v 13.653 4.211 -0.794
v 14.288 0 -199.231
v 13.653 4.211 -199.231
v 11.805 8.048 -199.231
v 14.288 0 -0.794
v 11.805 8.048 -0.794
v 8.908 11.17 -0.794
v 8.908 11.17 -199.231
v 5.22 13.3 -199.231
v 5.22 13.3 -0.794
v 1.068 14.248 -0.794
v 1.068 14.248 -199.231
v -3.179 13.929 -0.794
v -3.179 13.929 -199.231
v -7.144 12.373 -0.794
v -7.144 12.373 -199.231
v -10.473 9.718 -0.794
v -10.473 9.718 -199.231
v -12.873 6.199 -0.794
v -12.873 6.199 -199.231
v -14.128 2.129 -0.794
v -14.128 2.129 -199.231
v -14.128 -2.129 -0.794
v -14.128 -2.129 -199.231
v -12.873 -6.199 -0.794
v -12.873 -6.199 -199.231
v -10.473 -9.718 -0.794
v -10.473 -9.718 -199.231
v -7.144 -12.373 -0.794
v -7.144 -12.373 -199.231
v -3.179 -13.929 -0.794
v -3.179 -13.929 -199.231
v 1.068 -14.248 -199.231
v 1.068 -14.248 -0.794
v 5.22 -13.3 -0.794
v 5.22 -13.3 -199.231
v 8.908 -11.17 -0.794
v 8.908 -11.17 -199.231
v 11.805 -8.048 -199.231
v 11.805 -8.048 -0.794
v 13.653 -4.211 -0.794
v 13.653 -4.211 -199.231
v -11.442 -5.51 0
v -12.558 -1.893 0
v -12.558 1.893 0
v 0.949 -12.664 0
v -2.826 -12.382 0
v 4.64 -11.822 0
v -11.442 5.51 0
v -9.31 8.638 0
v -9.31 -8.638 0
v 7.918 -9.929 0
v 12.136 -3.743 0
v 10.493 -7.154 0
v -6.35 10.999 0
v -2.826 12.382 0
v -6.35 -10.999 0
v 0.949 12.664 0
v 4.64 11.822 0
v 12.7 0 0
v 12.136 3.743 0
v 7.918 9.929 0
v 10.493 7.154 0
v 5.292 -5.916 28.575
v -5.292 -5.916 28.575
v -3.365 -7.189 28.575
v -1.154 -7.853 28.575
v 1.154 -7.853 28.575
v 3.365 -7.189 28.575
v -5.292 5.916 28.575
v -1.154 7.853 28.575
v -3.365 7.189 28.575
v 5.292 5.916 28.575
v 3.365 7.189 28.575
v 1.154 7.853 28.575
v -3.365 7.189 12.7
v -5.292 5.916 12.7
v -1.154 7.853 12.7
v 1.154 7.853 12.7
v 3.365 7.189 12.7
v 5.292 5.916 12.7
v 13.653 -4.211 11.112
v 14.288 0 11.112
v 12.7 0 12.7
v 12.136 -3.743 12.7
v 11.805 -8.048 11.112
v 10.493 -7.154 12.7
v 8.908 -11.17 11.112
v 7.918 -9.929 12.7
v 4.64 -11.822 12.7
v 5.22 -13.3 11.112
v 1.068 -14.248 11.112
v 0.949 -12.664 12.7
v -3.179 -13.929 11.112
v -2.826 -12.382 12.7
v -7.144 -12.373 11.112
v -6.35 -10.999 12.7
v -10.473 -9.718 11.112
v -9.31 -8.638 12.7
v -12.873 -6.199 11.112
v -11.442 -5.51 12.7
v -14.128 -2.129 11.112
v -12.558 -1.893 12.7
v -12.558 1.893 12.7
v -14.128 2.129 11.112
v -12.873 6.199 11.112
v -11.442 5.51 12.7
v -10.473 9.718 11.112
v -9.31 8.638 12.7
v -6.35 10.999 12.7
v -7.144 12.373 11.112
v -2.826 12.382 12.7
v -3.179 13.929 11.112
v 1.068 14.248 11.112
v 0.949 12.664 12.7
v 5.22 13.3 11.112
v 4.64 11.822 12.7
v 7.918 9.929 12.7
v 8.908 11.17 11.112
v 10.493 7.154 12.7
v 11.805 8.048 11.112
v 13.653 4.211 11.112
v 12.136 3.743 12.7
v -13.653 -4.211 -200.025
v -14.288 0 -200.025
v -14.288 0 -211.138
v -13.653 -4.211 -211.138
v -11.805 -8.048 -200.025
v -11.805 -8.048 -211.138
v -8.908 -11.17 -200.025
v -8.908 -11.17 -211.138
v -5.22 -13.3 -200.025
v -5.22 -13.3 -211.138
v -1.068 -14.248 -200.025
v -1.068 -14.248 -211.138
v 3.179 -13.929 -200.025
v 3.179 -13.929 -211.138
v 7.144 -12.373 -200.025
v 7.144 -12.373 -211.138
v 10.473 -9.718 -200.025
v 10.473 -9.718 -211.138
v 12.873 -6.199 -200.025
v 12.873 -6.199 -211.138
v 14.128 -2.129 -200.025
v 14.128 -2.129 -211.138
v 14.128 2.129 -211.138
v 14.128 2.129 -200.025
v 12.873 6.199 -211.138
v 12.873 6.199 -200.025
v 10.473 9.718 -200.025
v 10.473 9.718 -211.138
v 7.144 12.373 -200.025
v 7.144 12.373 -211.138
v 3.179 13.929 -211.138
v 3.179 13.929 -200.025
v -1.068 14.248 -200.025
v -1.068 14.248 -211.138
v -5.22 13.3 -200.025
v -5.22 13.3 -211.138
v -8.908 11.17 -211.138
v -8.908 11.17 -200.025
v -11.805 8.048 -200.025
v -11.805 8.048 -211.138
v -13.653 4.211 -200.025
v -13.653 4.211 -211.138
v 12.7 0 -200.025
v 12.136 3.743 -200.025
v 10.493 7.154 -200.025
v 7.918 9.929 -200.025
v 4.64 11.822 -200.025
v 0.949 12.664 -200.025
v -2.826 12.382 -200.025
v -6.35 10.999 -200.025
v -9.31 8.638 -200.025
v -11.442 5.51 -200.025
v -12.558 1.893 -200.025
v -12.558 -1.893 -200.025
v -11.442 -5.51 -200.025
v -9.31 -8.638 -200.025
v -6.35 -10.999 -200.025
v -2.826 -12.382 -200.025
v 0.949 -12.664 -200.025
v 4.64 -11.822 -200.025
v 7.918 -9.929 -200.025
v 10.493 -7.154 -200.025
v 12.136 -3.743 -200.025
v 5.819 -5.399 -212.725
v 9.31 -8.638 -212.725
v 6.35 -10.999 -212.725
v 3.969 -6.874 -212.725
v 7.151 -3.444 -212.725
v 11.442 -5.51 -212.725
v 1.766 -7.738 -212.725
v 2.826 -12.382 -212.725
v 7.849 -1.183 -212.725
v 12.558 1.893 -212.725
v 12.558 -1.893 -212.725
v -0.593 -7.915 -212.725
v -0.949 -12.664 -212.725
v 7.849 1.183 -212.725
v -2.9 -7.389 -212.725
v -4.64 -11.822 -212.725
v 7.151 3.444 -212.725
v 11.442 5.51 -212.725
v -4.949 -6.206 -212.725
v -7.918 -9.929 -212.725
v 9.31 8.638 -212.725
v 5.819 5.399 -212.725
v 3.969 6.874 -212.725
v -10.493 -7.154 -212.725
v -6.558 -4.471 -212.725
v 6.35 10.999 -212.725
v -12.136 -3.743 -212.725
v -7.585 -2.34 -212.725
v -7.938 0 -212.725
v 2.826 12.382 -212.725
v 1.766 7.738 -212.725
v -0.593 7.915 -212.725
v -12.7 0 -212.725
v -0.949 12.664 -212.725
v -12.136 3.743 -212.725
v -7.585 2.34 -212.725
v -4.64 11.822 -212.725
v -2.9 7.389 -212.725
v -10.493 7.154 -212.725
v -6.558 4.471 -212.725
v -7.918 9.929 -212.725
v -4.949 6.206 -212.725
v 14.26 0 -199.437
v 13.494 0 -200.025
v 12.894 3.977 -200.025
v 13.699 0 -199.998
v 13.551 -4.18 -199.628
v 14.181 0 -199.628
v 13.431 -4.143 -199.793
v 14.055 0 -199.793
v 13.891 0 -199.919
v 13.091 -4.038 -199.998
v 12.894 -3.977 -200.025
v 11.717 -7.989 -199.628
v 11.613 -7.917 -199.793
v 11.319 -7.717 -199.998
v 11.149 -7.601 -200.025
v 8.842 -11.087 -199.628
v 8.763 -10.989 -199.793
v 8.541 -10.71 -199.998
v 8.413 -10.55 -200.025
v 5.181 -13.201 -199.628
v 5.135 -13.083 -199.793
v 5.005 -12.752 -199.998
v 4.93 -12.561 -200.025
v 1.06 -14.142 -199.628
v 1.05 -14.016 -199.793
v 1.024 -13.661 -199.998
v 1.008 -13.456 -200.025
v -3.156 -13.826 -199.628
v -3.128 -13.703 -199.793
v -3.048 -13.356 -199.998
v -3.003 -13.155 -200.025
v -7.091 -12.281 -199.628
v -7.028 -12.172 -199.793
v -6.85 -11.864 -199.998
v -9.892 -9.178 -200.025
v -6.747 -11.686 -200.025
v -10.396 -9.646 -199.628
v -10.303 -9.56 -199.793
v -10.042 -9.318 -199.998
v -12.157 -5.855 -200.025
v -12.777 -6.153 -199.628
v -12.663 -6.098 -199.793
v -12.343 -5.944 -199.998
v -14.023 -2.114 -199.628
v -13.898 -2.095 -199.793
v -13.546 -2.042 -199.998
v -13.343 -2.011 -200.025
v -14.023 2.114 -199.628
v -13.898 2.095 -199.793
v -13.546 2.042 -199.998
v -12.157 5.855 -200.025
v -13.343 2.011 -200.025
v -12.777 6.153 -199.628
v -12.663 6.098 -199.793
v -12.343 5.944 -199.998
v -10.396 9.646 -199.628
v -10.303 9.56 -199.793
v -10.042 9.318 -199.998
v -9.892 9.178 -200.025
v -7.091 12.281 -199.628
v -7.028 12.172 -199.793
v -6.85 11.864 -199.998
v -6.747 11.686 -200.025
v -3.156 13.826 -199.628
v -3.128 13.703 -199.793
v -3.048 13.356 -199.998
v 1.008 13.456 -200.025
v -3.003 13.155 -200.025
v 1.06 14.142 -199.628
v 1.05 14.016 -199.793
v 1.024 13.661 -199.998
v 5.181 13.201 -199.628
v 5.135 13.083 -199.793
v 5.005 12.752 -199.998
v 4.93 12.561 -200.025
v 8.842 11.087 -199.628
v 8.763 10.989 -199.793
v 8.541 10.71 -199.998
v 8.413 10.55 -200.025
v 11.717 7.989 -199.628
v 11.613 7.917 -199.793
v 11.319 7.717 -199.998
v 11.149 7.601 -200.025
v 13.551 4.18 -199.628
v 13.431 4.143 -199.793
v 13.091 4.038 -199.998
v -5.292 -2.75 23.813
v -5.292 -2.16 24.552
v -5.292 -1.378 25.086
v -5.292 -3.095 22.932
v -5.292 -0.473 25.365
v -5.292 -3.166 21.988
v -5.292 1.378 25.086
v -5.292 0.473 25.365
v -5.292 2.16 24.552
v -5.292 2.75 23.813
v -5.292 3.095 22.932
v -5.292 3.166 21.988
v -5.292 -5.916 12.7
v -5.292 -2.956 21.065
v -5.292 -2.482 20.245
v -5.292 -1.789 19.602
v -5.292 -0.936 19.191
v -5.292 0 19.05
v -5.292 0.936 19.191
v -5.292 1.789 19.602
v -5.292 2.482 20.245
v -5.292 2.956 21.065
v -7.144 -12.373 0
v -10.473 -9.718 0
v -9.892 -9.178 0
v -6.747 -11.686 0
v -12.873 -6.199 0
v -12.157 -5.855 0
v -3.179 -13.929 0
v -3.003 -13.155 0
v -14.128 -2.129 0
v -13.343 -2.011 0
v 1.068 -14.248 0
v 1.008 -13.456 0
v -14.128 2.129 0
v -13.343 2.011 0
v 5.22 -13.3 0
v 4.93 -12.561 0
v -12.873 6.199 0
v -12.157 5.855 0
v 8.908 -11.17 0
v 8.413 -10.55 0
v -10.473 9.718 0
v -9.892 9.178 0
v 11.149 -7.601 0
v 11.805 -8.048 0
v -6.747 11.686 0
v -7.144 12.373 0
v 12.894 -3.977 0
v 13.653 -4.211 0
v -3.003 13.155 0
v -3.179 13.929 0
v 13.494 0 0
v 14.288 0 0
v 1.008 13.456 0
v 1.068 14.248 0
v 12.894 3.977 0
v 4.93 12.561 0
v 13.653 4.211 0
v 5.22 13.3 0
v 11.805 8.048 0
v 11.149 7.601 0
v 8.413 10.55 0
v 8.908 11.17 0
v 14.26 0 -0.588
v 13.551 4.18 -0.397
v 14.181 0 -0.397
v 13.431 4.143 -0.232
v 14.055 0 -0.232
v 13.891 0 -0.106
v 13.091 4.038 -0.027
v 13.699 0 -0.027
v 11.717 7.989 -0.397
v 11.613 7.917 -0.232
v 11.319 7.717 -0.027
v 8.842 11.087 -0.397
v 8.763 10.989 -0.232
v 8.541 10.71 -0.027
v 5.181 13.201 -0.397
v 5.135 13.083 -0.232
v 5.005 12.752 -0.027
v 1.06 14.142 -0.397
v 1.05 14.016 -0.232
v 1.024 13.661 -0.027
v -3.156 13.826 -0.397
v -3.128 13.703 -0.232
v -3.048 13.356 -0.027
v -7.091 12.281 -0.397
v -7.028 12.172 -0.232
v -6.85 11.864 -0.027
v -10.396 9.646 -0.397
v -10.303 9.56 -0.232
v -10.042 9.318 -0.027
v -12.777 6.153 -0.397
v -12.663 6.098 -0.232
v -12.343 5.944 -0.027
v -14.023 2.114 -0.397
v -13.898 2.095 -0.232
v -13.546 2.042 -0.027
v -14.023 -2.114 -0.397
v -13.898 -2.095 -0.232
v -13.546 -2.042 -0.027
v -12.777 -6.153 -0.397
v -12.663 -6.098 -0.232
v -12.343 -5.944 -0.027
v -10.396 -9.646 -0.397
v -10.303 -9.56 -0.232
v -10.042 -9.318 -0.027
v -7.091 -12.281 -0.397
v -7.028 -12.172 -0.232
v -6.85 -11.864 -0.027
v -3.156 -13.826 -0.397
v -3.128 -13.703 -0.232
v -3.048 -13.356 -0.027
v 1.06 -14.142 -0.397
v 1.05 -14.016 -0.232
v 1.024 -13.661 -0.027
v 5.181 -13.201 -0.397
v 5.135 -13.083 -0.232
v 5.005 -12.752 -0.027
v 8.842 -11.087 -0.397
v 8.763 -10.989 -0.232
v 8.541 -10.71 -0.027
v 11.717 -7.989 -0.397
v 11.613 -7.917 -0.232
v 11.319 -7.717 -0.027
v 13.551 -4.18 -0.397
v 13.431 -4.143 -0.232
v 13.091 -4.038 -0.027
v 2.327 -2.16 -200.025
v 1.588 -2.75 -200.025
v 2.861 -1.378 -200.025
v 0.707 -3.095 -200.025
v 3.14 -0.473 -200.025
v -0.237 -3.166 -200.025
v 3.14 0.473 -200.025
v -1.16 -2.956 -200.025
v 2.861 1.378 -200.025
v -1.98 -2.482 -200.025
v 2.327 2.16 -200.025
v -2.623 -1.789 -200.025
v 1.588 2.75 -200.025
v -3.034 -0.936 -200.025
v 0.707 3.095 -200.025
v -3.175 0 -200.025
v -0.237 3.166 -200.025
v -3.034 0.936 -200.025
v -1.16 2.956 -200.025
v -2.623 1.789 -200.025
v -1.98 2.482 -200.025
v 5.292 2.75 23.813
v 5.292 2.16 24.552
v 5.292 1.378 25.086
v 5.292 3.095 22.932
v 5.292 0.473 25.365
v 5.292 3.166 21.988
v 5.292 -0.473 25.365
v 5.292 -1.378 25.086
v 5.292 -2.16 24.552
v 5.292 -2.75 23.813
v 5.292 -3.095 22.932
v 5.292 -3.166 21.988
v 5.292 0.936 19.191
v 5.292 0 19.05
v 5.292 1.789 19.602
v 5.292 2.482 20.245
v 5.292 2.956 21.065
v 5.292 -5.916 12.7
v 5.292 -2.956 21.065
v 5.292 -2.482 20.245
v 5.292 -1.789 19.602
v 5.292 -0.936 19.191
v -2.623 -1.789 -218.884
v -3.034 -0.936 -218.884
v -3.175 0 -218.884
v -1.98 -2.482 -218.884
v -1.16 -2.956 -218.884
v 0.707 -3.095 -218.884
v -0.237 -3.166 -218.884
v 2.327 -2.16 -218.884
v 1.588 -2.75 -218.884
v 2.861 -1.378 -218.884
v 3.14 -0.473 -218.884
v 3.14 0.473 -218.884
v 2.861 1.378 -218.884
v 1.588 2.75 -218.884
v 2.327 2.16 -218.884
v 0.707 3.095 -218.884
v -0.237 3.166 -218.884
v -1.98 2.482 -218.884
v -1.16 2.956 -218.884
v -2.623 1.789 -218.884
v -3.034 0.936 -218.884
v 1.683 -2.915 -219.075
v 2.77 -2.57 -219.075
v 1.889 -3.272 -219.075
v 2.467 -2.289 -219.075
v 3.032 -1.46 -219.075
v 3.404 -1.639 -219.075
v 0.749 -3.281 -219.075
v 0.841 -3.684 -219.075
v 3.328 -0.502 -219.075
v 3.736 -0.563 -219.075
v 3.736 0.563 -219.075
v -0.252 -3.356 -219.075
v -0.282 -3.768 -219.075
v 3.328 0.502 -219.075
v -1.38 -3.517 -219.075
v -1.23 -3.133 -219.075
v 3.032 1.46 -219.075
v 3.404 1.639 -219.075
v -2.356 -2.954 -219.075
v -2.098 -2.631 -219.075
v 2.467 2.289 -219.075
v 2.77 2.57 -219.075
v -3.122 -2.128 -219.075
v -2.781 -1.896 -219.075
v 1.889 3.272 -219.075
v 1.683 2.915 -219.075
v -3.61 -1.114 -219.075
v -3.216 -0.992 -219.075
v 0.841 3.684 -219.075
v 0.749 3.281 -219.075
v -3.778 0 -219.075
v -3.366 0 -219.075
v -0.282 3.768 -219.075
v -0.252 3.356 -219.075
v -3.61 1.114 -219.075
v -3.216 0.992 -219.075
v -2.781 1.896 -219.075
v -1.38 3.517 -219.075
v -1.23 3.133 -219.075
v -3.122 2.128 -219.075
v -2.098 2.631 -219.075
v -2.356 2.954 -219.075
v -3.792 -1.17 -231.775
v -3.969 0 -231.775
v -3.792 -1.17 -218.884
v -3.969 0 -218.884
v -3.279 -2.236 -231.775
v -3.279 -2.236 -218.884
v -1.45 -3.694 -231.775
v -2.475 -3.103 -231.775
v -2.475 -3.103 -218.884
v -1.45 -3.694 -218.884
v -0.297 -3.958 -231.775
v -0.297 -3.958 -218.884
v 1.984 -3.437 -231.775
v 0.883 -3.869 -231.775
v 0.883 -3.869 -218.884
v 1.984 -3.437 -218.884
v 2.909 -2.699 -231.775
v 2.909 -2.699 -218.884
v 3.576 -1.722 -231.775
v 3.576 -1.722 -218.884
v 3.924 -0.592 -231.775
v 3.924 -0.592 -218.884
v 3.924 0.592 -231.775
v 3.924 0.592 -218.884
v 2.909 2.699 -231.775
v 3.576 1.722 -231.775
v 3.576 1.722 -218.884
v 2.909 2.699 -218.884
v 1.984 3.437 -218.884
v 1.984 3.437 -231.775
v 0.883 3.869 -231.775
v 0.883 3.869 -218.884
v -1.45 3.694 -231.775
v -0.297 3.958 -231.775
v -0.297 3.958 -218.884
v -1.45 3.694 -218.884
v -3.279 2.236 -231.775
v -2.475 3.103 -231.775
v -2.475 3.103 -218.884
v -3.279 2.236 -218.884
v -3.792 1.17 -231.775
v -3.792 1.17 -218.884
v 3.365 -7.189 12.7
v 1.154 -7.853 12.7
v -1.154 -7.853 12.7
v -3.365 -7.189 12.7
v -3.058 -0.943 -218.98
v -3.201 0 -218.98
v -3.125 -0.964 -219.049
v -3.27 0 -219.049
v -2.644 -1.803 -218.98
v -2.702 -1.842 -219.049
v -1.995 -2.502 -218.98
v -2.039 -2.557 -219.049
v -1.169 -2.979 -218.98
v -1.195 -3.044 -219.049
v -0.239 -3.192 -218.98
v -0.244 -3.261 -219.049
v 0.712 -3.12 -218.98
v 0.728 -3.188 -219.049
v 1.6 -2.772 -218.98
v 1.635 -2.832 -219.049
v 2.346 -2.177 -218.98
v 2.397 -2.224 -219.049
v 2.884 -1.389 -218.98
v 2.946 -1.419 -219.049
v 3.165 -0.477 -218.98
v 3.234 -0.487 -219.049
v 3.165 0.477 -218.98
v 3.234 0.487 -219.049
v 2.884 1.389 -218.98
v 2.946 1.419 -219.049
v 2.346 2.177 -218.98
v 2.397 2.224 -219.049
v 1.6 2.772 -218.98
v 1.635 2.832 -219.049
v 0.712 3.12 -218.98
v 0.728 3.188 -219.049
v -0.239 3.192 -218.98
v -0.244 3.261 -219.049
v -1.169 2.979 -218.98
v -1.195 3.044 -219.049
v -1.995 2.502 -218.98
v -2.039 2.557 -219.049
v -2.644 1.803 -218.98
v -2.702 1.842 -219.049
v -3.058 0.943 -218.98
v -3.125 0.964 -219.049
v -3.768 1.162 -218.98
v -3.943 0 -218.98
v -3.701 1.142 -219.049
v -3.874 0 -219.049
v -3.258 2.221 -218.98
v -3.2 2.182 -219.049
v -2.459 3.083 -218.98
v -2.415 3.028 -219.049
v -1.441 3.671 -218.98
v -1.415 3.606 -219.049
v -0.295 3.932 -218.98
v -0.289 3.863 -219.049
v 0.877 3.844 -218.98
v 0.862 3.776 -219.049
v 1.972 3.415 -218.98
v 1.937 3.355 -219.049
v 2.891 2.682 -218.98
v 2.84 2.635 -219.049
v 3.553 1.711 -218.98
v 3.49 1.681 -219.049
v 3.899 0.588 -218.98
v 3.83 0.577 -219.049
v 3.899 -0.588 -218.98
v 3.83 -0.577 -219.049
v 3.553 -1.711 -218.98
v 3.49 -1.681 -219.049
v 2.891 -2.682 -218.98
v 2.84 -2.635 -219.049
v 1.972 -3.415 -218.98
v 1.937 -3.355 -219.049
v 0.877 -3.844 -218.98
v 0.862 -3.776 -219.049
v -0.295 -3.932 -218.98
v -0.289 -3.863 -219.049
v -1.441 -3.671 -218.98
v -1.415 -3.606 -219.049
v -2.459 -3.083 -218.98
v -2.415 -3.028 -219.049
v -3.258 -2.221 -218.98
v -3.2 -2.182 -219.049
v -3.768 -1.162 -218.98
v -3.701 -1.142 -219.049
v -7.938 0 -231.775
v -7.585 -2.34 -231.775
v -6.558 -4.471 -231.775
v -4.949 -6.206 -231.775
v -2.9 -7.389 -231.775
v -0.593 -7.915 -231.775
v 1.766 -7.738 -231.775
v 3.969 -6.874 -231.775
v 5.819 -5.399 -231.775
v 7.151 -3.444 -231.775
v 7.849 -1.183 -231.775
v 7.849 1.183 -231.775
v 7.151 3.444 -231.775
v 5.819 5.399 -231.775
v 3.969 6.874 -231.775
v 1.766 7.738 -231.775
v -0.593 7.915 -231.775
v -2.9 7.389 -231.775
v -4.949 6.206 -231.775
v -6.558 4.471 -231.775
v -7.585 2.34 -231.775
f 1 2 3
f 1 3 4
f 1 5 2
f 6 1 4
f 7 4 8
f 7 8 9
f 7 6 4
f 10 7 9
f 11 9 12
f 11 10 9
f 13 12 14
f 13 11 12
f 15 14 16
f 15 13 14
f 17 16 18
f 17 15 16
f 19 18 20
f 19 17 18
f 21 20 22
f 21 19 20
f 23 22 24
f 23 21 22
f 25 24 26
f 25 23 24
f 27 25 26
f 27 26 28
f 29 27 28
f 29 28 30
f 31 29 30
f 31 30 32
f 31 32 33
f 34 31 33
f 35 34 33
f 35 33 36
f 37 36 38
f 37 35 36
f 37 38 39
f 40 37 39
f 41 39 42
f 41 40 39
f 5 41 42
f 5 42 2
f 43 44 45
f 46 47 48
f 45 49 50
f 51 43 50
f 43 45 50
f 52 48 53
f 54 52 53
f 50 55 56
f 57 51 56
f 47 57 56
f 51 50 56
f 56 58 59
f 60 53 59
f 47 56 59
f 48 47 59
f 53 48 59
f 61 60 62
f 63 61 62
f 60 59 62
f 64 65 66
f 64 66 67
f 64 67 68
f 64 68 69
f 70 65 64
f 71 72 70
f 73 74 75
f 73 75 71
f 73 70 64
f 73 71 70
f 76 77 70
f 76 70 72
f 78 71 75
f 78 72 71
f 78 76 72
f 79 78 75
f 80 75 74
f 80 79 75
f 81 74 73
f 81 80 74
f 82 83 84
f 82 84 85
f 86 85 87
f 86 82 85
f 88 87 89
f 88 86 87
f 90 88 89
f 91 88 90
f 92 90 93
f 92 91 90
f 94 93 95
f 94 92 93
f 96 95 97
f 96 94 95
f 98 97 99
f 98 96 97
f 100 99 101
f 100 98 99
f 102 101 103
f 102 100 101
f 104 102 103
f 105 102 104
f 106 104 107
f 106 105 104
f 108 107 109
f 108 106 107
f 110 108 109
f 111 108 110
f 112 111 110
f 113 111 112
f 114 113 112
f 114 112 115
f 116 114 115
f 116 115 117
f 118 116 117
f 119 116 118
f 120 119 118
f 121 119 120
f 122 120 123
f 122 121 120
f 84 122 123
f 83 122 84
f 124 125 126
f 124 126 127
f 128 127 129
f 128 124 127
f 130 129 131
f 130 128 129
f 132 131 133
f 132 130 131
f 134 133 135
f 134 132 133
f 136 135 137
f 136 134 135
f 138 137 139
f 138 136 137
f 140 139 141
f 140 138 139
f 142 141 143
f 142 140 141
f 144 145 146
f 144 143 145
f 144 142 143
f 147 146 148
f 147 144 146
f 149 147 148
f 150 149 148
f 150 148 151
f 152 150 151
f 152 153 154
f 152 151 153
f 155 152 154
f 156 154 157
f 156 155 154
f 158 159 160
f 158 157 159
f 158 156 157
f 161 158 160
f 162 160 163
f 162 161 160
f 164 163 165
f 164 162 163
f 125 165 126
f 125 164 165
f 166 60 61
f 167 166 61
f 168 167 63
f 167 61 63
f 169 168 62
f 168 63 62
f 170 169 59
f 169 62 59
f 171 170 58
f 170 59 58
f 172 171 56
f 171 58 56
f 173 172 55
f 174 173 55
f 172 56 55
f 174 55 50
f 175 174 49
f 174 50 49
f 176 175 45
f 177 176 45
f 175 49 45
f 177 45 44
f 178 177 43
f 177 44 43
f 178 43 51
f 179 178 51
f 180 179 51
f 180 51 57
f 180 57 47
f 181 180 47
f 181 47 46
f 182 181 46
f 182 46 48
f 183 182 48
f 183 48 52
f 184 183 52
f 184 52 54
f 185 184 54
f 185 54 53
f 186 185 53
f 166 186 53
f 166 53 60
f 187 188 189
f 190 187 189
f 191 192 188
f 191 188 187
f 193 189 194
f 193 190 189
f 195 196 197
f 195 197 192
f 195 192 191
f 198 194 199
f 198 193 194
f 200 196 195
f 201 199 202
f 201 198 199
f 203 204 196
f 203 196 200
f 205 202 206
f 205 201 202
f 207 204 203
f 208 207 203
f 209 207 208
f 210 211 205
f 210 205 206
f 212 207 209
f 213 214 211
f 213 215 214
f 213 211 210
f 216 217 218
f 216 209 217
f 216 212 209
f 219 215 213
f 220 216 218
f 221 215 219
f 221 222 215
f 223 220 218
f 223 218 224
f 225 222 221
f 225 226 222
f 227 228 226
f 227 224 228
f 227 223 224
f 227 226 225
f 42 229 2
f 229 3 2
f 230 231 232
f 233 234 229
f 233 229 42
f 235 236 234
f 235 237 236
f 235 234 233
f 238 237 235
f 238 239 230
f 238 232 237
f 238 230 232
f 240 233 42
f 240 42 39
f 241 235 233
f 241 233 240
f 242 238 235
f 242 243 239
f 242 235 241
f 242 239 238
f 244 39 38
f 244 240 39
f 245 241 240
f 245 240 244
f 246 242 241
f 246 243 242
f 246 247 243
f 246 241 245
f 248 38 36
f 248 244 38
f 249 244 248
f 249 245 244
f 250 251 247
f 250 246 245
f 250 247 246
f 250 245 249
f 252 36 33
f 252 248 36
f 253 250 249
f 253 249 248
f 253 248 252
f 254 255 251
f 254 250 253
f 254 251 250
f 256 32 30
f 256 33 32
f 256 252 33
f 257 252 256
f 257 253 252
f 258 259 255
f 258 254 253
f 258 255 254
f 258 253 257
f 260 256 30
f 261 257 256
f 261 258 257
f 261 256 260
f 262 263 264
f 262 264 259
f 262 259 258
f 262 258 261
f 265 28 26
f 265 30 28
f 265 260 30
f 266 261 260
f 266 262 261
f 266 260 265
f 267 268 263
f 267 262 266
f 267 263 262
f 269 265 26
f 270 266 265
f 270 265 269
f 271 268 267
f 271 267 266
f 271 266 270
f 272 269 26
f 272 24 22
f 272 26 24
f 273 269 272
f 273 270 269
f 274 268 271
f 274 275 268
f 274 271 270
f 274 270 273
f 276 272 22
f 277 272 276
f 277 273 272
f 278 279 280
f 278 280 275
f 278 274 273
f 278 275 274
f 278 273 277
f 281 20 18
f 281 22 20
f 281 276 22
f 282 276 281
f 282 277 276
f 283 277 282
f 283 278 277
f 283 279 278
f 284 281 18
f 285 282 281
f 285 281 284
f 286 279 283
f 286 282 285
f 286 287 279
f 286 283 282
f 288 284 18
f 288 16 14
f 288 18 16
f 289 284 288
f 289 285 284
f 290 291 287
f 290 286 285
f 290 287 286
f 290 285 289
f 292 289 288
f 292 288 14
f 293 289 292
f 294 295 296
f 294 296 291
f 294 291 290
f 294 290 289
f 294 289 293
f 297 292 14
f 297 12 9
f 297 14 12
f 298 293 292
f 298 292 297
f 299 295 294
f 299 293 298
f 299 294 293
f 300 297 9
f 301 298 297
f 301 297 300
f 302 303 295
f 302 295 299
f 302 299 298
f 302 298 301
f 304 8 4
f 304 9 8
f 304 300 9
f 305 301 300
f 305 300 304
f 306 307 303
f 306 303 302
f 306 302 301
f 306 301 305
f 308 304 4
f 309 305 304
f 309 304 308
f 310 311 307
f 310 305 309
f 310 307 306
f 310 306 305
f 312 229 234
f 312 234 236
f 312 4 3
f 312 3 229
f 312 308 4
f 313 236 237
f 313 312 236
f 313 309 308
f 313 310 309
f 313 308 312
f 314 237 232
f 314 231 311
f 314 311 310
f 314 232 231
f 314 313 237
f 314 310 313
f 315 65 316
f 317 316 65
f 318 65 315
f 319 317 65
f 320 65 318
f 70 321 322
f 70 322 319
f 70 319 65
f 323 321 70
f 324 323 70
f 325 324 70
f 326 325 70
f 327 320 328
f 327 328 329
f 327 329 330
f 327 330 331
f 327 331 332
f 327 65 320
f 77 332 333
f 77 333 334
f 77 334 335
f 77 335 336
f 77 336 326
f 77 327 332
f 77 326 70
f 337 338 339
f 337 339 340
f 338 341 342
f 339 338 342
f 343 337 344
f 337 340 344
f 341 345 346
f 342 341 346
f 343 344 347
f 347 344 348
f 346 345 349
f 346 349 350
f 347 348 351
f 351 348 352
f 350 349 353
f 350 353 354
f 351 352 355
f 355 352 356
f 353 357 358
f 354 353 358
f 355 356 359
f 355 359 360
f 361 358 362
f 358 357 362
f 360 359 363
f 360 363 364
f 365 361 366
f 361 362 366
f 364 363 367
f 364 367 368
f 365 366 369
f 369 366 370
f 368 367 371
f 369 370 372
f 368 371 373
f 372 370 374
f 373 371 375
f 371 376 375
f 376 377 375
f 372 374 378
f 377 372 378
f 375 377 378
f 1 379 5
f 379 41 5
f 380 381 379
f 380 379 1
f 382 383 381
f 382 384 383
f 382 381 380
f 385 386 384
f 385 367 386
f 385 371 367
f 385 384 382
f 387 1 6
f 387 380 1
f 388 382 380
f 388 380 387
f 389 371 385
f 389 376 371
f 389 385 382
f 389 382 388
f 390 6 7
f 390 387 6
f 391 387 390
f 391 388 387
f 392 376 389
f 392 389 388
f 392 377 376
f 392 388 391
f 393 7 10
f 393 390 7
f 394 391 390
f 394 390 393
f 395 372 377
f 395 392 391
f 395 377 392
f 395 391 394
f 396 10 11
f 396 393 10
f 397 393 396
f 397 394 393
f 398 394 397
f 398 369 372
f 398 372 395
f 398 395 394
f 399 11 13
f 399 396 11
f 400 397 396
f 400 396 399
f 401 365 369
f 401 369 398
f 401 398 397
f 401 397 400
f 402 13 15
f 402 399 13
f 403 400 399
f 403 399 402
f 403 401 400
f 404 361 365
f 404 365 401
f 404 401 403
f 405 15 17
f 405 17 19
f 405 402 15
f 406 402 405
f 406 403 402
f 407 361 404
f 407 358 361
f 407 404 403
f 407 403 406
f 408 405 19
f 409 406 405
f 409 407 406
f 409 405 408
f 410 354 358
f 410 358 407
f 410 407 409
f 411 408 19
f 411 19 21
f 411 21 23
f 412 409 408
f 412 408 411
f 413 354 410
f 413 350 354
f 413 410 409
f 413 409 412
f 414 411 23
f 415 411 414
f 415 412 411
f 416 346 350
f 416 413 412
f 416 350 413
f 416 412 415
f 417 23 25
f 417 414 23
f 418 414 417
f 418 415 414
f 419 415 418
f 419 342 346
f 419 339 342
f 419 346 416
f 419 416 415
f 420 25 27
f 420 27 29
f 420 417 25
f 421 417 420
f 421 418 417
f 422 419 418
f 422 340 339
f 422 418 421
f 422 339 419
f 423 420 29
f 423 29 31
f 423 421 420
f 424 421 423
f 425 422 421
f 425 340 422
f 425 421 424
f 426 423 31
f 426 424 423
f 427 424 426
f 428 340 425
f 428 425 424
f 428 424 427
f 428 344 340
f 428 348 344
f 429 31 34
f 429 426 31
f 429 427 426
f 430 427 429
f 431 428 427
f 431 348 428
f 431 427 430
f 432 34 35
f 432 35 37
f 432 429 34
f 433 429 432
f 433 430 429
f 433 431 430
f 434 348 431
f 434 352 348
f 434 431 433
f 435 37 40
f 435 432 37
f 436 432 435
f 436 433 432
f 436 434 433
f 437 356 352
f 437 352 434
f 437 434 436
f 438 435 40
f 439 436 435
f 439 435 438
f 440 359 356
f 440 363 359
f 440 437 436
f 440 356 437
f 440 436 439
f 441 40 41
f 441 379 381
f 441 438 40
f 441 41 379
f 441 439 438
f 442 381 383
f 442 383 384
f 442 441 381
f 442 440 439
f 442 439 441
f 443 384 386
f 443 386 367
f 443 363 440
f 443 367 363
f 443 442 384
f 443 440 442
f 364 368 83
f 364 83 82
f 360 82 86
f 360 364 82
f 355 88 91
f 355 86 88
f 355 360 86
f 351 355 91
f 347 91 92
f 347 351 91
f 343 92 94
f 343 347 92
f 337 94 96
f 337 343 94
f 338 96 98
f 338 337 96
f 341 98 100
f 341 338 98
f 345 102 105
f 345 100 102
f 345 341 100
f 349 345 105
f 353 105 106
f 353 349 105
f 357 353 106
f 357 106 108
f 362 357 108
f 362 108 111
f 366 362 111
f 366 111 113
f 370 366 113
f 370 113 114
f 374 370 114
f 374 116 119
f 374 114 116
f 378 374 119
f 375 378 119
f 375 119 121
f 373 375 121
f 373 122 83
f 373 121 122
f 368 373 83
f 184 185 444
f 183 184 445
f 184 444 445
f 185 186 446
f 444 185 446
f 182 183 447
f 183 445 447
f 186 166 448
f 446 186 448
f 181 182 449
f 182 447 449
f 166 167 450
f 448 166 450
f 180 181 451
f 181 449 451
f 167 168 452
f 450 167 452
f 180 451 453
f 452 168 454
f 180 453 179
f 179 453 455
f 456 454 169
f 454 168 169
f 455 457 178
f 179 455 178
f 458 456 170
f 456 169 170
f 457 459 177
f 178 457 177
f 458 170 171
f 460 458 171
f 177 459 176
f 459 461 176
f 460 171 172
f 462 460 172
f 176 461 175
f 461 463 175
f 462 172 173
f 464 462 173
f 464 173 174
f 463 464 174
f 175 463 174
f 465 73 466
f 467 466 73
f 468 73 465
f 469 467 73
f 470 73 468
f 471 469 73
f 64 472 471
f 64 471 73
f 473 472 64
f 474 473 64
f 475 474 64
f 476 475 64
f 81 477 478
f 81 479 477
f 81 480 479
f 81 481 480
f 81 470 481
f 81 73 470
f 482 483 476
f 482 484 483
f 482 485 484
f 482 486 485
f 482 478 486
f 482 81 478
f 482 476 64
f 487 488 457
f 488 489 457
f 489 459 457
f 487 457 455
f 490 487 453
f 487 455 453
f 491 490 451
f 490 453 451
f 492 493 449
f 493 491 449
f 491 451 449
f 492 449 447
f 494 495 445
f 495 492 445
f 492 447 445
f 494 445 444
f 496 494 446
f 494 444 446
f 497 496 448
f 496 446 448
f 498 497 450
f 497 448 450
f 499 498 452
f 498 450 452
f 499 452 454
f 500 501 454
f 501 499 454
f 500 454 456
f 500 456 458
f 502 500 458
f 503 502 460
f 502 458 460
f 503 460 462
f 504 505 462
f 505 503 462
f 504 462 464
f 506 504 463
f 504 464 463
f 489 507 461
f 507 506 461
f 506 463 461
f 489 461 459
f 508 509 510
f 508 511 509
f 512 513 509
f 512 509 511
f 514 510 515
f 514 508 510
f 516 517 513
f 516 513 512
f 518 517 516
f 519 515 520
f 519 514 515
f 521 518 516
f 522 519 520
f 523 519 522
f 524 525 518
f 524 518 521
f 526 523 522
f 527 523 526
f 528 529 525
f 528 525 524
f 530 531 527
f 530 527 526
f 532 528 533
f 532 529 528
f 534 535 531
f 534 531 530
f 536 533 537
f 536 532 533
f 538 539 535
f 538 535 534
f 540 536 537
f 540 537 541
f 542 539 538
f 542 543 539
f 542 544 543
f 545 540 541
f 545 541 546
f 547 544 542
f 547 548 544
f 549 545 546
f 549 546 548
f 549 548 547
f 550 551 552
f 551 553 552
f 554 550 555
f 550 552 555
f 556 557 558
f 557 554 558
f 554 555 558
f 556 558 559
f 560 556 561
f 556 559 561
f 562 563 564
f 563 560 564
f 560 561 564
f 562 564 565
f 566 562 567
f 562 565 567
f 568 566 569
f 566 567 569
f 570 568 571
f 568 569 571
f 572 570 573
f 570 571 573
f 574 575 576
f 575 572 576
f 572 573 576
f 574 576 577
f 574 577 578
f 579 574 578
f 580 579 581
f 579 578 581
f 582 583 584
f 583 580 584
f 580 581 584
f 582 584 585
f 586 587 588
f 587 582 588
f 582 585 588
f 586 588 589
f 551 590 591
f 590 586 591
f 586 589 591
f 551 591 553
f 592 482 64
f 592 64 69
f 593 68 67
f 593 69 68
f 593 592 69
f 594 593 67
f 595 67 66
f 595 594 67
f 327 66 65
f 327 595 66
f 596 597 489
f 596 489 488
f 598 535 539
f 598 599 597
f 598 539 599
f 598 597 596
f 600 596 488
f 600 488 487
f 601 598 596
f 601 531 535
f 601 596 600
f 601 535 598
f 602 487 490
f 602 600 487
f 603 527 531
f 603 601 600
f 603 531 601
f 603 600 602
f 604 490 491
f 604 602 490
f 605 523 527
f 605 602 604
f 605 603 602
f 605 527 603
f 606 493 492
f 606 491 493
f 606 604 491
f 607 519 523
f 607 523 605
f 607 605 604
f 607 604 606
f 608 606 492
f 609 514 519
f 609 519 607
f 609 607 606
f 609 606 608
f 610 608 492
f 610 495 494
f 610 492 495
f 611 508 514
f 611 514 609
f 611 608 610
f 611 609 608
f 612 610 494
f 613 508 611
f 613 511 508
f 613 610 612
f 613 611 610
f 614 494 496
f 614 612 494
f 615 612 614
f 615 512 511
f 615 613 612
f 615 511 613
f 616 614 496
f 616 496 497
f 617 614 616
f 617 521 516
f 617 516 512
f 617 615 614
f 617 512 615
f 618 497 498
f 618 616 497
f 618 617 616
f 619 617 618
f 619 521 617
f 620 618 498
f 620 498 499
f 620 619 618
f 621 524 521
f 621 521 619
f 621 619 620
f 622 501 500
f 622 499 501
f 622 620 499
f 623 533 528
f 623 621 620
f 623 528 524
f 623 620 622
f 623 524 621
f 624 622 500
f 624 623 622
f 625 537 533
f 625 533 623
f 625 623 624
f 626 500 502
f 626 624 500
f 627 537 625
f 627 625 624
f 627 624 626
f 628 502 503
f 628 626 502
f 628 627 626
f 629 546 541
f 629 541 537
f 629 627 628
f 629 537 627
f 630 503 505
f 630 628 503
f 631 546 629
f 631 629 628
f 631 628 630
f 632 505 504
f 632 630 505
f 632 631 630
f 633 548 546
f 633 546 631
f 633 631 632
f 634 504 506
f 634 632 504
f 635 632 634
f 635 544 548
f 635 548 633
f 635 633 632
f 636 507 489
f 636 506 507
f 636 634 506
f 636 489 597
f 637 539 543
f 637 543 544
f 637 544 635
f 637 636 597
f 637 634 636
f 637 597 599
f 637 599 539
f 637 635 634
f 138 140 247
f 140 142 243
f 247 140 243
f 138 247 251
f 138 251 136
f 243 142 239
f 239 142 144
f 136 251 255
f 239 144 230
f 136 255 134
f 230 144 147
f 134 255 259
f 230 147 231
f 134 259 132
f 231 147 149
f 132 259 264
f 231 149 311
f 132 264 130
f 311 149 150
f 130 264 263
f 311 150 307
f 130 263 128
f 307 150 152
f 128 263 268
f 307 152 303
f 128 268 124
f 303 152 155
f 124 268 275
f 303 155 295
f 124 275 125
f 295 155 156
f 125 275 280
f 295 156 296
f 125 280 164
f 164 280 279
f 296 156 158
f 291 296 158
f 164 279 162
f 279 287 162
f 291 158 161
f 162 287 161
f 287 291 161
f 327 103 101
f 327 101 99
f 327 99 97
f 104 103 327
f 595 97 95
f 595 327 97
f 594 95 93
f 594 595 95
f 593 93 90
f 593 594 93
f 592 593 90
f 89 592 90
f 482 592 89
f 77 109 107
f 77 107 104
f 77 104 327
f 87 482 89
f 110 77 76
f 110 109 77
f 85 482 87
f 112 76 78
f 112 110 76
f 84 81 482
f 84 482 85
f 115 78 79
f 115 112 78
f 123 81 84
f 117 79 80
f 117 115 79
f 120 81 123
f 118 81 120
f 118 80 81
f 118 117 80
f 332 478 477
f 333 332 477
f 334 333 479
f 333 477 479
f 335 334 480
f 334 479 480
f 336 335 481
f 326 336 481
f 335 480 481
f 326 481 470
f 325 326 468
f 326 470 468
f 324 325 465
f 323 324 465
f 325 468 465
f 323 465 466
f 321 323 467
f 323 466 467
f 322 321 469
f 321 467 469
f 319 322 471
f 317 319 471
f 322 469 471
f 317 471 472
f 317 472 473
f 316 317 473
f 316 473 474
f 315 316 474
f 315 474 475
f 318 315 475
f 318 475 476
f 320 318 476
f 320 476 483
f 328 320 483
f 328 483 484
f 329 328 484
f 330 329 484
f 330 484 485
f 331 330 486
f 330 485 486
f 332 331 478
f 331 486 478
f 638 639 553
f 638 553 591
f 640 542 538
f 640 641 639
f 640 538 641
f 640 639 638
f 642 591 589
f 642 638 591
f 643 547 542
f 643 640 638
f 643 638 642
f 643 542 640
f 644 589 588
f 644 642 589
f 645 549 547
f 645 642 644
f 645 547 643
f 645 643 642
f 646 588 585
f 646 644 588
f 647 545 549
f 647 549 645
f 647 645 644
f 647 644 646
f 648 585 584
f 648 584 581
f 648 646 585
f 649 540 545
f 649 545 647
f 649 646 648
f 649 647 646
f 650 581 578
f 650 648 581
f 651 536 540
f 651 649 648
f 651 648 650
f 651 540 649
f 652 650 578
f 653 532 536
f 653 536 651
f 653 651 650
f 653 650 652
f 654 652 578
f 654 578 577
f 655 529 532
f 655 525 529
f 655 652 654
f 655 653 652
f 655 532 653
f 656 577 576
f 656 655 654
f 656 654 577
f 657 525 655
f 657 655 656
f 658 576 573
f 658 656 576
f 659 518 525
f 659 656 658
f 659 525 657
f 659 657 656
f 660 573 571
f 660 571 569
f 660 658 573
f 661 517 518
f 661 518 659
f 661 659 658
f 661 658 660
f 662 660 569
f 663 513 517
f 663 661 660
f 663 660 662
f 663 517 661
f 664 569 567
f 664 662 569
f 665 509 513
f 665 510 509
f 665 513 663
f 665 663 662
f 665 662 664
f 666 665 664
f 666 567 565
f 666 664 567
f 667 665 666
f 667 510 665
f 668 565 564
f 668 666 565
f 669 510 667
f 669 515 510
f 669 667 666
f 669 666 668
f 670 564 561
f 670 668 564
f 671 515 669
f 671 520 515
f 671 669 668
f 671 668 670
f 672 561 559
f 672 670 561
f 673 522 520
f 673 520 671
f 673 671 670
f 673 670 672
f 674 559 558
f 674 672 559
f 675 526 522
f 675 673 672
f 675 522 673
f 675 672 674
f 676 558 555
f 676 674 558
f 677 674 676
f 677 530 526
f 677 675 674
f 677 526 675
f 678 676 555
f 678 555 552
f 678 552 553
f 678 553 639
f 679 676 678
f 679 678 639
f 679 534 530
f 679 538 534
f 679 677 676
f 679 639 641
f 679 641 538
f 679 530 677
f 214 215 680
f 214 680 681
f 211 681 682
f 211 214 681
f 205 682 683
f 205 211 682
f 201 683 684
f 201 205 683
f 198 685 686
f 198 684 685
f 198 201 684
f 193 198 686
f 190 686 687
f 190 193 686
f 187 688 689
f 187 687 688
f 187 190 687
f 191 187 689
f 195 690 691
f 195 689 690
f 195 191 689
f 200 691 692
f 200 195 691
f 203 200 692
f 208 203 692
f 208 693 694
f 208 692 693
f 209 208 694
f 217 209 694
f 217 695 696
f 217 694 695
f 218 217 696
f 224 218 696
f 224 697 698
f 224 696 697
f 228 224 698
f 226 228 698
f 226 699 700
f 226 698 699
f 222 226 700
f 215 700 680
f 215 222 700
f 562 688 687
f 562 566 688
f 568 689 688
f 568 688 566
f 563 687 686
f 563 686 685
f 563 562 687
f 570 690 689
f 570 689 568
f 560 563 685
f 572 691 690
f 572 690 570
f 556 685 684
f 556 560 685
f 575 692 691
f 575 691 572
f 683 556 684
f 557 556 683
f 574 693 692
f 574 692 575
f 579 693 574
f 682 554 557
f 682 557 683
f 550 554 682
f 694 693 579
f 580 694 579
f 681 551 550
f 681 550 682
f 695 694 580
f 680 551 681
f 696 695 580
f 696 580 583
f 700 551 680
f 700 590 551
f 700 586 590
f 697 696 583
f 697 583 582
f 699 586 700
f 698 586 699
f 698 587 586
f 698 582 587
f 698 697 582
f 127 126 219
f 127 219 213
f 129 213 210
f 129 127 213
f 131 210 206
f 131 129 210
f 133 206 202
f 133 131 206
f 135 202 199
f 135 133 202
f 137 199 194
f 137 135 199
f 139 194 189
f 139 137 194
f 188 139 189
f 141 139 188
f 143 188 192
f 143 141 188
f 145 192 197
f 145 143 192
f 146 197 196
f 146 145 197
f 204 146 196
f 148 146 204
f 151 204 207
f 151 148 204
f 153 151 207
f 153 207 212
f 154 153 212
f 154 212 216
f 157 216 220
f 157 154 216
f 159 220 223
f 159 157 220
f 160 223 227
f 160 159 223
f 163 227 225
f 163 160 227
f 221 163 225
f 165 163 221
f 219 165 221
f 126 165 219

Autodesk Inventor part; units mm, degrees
ref_plane "YZ Plane" through (0, 0, 0) normal (1, 0, 0) x (0, 1, 0)
ref_plane "XZ Plane" through (0, 0, 0) normal (0, 1, 0) x (-1, 0, 0)
ref_plane "XY Plane" through (0, 0, 0) normal (0, 0, 1) x (1, 0, 0)
sketch "Sketch1" plane through (0, 0, 0) normal (0, 0, 1) x (1, 0, 0)
  circle A0 centre (0, 0) radius 12.7
  circle A1 centre (0, 0) radius 14.2875
  line L0 (-5.2917, 5.9163) -> (5.2917, 5.9163)
  line L1 (5.2917, 5.9163) -> (5.2917, -5.9163)
  line L2 (5.2917, -5.9163) -> (-5.2917, -5.9163)
  line L3 (-5.2917, -5.9163) -> (-5.2917, 5.9163)
  arc A2 (5.2917, 5.9163) -> (-5.2917, 5.9163) centre (0, 0) ccw
  arc A3 (-5.2917, -5.9163) -> (5.2917, -5.9163) centre (0, 0) ccw
  dimension "d2" = 25.4
  dimension "d3" = 28.575
  dimension "d4" = 10.5833
  dimension "d5" = 5.2917
  dimension "d6" = 11.8325
  dimension "d7" = 5.9163
  dimension "d8" = 7.9375
extrude "Extrusion1" add sketch "Sketch1" against normal blind 200.025 contours A1
fillet "Fillet1" radius 0.7937 2 edges at (-14.2875, 0, 0) (-14.2875, 0, -200.025)
extrude "Extrusion2" add sketch "Sketch1" along normal blind 12.7 contours A0 | A1
extrude "Extrusion3" add sketch "Sketch1" along normal blind 28.575 contours A2 L0 | L0 L1 L2 L3 | L2 A3
chamfer "Chamfer1" distance 1.5875 angle 45 1 edges at (-14.2875, 0, 12.7)
thread "Thread1" size "3/4-10 UNC" class "2A" standard "ANSI Unified Screw Threads" full length
thread "Thread2" size "3/4-10 UNC" class "2A" standard "ANSI Unified Screw Threads" full length
sketch "Sketch2" plane through (0, 0, -200.025) normal (0, 0, -1) x (-1, 0, 0)
  circle A0 centre (0, 0) radius 14.2875 projected
  circle A1 centre (0, 0) radius 7.9375
  circle A2 centre (0, 0) radius 3.175
  circle A3 centre (0, 0) radius 3.9688
  dimension "d24" = 15.875
  dimension "d25" = 7.9375
  dimension "d26" = 6.35
extrude "Extrusion4" add sketch "Sketch2" along normal blind 12.7 contours A0
extrude "Extrusion5" add sketch "Sketch2" along normal blind 19.05 contours A3
fillet "Fillet2" radius 0.1905 2 edges at (3.9688, 0, -219.075) (3.175, 0, -219.075)
extrude "Extrusion6" add sketch "Sketch2" along normal blind 31.75 contours A1
chamfer "Chamfer2" distance 1.5875 angle 45 1 edges at (14.2875, 0, -212.725)
thread "Thread3" size "3/4-10 UNC" class "2A" standard "ANSI Unified Screw Threads" full length
sketch "Sketch3" plane through (5.2917, -5.9163, 12.7) normal (1, 0, 0) x (0, 0, -1)
  line L0 (0, 11.8325) -> (-15.875, 11.8325) projected
  line L1 (-15.875, 11.8325) -> (-15.875, 0) projected
  line L2 (0, 0) -> (-15.875, 0) projected
  circle A0 centre (-9.525, 5.9163) radius 3.175
  point P0 (12.7, 5.9163)
  dimension "d39" = 6.35
  dimension "d40" = 5.9163
  dimension "d41" = 11.8325
  dimension "d42" = 6.35
extrude "Extrusion7" cut sketch "Sketch3" against normal blind 25.4
equation "\"d5\" = 0.5 * d4"
equation "\"d7\" = 0.5 * d6"
equation "\"d40\" = 0.5 * d41"
properties part number "6''  by 1'' dia piston"
